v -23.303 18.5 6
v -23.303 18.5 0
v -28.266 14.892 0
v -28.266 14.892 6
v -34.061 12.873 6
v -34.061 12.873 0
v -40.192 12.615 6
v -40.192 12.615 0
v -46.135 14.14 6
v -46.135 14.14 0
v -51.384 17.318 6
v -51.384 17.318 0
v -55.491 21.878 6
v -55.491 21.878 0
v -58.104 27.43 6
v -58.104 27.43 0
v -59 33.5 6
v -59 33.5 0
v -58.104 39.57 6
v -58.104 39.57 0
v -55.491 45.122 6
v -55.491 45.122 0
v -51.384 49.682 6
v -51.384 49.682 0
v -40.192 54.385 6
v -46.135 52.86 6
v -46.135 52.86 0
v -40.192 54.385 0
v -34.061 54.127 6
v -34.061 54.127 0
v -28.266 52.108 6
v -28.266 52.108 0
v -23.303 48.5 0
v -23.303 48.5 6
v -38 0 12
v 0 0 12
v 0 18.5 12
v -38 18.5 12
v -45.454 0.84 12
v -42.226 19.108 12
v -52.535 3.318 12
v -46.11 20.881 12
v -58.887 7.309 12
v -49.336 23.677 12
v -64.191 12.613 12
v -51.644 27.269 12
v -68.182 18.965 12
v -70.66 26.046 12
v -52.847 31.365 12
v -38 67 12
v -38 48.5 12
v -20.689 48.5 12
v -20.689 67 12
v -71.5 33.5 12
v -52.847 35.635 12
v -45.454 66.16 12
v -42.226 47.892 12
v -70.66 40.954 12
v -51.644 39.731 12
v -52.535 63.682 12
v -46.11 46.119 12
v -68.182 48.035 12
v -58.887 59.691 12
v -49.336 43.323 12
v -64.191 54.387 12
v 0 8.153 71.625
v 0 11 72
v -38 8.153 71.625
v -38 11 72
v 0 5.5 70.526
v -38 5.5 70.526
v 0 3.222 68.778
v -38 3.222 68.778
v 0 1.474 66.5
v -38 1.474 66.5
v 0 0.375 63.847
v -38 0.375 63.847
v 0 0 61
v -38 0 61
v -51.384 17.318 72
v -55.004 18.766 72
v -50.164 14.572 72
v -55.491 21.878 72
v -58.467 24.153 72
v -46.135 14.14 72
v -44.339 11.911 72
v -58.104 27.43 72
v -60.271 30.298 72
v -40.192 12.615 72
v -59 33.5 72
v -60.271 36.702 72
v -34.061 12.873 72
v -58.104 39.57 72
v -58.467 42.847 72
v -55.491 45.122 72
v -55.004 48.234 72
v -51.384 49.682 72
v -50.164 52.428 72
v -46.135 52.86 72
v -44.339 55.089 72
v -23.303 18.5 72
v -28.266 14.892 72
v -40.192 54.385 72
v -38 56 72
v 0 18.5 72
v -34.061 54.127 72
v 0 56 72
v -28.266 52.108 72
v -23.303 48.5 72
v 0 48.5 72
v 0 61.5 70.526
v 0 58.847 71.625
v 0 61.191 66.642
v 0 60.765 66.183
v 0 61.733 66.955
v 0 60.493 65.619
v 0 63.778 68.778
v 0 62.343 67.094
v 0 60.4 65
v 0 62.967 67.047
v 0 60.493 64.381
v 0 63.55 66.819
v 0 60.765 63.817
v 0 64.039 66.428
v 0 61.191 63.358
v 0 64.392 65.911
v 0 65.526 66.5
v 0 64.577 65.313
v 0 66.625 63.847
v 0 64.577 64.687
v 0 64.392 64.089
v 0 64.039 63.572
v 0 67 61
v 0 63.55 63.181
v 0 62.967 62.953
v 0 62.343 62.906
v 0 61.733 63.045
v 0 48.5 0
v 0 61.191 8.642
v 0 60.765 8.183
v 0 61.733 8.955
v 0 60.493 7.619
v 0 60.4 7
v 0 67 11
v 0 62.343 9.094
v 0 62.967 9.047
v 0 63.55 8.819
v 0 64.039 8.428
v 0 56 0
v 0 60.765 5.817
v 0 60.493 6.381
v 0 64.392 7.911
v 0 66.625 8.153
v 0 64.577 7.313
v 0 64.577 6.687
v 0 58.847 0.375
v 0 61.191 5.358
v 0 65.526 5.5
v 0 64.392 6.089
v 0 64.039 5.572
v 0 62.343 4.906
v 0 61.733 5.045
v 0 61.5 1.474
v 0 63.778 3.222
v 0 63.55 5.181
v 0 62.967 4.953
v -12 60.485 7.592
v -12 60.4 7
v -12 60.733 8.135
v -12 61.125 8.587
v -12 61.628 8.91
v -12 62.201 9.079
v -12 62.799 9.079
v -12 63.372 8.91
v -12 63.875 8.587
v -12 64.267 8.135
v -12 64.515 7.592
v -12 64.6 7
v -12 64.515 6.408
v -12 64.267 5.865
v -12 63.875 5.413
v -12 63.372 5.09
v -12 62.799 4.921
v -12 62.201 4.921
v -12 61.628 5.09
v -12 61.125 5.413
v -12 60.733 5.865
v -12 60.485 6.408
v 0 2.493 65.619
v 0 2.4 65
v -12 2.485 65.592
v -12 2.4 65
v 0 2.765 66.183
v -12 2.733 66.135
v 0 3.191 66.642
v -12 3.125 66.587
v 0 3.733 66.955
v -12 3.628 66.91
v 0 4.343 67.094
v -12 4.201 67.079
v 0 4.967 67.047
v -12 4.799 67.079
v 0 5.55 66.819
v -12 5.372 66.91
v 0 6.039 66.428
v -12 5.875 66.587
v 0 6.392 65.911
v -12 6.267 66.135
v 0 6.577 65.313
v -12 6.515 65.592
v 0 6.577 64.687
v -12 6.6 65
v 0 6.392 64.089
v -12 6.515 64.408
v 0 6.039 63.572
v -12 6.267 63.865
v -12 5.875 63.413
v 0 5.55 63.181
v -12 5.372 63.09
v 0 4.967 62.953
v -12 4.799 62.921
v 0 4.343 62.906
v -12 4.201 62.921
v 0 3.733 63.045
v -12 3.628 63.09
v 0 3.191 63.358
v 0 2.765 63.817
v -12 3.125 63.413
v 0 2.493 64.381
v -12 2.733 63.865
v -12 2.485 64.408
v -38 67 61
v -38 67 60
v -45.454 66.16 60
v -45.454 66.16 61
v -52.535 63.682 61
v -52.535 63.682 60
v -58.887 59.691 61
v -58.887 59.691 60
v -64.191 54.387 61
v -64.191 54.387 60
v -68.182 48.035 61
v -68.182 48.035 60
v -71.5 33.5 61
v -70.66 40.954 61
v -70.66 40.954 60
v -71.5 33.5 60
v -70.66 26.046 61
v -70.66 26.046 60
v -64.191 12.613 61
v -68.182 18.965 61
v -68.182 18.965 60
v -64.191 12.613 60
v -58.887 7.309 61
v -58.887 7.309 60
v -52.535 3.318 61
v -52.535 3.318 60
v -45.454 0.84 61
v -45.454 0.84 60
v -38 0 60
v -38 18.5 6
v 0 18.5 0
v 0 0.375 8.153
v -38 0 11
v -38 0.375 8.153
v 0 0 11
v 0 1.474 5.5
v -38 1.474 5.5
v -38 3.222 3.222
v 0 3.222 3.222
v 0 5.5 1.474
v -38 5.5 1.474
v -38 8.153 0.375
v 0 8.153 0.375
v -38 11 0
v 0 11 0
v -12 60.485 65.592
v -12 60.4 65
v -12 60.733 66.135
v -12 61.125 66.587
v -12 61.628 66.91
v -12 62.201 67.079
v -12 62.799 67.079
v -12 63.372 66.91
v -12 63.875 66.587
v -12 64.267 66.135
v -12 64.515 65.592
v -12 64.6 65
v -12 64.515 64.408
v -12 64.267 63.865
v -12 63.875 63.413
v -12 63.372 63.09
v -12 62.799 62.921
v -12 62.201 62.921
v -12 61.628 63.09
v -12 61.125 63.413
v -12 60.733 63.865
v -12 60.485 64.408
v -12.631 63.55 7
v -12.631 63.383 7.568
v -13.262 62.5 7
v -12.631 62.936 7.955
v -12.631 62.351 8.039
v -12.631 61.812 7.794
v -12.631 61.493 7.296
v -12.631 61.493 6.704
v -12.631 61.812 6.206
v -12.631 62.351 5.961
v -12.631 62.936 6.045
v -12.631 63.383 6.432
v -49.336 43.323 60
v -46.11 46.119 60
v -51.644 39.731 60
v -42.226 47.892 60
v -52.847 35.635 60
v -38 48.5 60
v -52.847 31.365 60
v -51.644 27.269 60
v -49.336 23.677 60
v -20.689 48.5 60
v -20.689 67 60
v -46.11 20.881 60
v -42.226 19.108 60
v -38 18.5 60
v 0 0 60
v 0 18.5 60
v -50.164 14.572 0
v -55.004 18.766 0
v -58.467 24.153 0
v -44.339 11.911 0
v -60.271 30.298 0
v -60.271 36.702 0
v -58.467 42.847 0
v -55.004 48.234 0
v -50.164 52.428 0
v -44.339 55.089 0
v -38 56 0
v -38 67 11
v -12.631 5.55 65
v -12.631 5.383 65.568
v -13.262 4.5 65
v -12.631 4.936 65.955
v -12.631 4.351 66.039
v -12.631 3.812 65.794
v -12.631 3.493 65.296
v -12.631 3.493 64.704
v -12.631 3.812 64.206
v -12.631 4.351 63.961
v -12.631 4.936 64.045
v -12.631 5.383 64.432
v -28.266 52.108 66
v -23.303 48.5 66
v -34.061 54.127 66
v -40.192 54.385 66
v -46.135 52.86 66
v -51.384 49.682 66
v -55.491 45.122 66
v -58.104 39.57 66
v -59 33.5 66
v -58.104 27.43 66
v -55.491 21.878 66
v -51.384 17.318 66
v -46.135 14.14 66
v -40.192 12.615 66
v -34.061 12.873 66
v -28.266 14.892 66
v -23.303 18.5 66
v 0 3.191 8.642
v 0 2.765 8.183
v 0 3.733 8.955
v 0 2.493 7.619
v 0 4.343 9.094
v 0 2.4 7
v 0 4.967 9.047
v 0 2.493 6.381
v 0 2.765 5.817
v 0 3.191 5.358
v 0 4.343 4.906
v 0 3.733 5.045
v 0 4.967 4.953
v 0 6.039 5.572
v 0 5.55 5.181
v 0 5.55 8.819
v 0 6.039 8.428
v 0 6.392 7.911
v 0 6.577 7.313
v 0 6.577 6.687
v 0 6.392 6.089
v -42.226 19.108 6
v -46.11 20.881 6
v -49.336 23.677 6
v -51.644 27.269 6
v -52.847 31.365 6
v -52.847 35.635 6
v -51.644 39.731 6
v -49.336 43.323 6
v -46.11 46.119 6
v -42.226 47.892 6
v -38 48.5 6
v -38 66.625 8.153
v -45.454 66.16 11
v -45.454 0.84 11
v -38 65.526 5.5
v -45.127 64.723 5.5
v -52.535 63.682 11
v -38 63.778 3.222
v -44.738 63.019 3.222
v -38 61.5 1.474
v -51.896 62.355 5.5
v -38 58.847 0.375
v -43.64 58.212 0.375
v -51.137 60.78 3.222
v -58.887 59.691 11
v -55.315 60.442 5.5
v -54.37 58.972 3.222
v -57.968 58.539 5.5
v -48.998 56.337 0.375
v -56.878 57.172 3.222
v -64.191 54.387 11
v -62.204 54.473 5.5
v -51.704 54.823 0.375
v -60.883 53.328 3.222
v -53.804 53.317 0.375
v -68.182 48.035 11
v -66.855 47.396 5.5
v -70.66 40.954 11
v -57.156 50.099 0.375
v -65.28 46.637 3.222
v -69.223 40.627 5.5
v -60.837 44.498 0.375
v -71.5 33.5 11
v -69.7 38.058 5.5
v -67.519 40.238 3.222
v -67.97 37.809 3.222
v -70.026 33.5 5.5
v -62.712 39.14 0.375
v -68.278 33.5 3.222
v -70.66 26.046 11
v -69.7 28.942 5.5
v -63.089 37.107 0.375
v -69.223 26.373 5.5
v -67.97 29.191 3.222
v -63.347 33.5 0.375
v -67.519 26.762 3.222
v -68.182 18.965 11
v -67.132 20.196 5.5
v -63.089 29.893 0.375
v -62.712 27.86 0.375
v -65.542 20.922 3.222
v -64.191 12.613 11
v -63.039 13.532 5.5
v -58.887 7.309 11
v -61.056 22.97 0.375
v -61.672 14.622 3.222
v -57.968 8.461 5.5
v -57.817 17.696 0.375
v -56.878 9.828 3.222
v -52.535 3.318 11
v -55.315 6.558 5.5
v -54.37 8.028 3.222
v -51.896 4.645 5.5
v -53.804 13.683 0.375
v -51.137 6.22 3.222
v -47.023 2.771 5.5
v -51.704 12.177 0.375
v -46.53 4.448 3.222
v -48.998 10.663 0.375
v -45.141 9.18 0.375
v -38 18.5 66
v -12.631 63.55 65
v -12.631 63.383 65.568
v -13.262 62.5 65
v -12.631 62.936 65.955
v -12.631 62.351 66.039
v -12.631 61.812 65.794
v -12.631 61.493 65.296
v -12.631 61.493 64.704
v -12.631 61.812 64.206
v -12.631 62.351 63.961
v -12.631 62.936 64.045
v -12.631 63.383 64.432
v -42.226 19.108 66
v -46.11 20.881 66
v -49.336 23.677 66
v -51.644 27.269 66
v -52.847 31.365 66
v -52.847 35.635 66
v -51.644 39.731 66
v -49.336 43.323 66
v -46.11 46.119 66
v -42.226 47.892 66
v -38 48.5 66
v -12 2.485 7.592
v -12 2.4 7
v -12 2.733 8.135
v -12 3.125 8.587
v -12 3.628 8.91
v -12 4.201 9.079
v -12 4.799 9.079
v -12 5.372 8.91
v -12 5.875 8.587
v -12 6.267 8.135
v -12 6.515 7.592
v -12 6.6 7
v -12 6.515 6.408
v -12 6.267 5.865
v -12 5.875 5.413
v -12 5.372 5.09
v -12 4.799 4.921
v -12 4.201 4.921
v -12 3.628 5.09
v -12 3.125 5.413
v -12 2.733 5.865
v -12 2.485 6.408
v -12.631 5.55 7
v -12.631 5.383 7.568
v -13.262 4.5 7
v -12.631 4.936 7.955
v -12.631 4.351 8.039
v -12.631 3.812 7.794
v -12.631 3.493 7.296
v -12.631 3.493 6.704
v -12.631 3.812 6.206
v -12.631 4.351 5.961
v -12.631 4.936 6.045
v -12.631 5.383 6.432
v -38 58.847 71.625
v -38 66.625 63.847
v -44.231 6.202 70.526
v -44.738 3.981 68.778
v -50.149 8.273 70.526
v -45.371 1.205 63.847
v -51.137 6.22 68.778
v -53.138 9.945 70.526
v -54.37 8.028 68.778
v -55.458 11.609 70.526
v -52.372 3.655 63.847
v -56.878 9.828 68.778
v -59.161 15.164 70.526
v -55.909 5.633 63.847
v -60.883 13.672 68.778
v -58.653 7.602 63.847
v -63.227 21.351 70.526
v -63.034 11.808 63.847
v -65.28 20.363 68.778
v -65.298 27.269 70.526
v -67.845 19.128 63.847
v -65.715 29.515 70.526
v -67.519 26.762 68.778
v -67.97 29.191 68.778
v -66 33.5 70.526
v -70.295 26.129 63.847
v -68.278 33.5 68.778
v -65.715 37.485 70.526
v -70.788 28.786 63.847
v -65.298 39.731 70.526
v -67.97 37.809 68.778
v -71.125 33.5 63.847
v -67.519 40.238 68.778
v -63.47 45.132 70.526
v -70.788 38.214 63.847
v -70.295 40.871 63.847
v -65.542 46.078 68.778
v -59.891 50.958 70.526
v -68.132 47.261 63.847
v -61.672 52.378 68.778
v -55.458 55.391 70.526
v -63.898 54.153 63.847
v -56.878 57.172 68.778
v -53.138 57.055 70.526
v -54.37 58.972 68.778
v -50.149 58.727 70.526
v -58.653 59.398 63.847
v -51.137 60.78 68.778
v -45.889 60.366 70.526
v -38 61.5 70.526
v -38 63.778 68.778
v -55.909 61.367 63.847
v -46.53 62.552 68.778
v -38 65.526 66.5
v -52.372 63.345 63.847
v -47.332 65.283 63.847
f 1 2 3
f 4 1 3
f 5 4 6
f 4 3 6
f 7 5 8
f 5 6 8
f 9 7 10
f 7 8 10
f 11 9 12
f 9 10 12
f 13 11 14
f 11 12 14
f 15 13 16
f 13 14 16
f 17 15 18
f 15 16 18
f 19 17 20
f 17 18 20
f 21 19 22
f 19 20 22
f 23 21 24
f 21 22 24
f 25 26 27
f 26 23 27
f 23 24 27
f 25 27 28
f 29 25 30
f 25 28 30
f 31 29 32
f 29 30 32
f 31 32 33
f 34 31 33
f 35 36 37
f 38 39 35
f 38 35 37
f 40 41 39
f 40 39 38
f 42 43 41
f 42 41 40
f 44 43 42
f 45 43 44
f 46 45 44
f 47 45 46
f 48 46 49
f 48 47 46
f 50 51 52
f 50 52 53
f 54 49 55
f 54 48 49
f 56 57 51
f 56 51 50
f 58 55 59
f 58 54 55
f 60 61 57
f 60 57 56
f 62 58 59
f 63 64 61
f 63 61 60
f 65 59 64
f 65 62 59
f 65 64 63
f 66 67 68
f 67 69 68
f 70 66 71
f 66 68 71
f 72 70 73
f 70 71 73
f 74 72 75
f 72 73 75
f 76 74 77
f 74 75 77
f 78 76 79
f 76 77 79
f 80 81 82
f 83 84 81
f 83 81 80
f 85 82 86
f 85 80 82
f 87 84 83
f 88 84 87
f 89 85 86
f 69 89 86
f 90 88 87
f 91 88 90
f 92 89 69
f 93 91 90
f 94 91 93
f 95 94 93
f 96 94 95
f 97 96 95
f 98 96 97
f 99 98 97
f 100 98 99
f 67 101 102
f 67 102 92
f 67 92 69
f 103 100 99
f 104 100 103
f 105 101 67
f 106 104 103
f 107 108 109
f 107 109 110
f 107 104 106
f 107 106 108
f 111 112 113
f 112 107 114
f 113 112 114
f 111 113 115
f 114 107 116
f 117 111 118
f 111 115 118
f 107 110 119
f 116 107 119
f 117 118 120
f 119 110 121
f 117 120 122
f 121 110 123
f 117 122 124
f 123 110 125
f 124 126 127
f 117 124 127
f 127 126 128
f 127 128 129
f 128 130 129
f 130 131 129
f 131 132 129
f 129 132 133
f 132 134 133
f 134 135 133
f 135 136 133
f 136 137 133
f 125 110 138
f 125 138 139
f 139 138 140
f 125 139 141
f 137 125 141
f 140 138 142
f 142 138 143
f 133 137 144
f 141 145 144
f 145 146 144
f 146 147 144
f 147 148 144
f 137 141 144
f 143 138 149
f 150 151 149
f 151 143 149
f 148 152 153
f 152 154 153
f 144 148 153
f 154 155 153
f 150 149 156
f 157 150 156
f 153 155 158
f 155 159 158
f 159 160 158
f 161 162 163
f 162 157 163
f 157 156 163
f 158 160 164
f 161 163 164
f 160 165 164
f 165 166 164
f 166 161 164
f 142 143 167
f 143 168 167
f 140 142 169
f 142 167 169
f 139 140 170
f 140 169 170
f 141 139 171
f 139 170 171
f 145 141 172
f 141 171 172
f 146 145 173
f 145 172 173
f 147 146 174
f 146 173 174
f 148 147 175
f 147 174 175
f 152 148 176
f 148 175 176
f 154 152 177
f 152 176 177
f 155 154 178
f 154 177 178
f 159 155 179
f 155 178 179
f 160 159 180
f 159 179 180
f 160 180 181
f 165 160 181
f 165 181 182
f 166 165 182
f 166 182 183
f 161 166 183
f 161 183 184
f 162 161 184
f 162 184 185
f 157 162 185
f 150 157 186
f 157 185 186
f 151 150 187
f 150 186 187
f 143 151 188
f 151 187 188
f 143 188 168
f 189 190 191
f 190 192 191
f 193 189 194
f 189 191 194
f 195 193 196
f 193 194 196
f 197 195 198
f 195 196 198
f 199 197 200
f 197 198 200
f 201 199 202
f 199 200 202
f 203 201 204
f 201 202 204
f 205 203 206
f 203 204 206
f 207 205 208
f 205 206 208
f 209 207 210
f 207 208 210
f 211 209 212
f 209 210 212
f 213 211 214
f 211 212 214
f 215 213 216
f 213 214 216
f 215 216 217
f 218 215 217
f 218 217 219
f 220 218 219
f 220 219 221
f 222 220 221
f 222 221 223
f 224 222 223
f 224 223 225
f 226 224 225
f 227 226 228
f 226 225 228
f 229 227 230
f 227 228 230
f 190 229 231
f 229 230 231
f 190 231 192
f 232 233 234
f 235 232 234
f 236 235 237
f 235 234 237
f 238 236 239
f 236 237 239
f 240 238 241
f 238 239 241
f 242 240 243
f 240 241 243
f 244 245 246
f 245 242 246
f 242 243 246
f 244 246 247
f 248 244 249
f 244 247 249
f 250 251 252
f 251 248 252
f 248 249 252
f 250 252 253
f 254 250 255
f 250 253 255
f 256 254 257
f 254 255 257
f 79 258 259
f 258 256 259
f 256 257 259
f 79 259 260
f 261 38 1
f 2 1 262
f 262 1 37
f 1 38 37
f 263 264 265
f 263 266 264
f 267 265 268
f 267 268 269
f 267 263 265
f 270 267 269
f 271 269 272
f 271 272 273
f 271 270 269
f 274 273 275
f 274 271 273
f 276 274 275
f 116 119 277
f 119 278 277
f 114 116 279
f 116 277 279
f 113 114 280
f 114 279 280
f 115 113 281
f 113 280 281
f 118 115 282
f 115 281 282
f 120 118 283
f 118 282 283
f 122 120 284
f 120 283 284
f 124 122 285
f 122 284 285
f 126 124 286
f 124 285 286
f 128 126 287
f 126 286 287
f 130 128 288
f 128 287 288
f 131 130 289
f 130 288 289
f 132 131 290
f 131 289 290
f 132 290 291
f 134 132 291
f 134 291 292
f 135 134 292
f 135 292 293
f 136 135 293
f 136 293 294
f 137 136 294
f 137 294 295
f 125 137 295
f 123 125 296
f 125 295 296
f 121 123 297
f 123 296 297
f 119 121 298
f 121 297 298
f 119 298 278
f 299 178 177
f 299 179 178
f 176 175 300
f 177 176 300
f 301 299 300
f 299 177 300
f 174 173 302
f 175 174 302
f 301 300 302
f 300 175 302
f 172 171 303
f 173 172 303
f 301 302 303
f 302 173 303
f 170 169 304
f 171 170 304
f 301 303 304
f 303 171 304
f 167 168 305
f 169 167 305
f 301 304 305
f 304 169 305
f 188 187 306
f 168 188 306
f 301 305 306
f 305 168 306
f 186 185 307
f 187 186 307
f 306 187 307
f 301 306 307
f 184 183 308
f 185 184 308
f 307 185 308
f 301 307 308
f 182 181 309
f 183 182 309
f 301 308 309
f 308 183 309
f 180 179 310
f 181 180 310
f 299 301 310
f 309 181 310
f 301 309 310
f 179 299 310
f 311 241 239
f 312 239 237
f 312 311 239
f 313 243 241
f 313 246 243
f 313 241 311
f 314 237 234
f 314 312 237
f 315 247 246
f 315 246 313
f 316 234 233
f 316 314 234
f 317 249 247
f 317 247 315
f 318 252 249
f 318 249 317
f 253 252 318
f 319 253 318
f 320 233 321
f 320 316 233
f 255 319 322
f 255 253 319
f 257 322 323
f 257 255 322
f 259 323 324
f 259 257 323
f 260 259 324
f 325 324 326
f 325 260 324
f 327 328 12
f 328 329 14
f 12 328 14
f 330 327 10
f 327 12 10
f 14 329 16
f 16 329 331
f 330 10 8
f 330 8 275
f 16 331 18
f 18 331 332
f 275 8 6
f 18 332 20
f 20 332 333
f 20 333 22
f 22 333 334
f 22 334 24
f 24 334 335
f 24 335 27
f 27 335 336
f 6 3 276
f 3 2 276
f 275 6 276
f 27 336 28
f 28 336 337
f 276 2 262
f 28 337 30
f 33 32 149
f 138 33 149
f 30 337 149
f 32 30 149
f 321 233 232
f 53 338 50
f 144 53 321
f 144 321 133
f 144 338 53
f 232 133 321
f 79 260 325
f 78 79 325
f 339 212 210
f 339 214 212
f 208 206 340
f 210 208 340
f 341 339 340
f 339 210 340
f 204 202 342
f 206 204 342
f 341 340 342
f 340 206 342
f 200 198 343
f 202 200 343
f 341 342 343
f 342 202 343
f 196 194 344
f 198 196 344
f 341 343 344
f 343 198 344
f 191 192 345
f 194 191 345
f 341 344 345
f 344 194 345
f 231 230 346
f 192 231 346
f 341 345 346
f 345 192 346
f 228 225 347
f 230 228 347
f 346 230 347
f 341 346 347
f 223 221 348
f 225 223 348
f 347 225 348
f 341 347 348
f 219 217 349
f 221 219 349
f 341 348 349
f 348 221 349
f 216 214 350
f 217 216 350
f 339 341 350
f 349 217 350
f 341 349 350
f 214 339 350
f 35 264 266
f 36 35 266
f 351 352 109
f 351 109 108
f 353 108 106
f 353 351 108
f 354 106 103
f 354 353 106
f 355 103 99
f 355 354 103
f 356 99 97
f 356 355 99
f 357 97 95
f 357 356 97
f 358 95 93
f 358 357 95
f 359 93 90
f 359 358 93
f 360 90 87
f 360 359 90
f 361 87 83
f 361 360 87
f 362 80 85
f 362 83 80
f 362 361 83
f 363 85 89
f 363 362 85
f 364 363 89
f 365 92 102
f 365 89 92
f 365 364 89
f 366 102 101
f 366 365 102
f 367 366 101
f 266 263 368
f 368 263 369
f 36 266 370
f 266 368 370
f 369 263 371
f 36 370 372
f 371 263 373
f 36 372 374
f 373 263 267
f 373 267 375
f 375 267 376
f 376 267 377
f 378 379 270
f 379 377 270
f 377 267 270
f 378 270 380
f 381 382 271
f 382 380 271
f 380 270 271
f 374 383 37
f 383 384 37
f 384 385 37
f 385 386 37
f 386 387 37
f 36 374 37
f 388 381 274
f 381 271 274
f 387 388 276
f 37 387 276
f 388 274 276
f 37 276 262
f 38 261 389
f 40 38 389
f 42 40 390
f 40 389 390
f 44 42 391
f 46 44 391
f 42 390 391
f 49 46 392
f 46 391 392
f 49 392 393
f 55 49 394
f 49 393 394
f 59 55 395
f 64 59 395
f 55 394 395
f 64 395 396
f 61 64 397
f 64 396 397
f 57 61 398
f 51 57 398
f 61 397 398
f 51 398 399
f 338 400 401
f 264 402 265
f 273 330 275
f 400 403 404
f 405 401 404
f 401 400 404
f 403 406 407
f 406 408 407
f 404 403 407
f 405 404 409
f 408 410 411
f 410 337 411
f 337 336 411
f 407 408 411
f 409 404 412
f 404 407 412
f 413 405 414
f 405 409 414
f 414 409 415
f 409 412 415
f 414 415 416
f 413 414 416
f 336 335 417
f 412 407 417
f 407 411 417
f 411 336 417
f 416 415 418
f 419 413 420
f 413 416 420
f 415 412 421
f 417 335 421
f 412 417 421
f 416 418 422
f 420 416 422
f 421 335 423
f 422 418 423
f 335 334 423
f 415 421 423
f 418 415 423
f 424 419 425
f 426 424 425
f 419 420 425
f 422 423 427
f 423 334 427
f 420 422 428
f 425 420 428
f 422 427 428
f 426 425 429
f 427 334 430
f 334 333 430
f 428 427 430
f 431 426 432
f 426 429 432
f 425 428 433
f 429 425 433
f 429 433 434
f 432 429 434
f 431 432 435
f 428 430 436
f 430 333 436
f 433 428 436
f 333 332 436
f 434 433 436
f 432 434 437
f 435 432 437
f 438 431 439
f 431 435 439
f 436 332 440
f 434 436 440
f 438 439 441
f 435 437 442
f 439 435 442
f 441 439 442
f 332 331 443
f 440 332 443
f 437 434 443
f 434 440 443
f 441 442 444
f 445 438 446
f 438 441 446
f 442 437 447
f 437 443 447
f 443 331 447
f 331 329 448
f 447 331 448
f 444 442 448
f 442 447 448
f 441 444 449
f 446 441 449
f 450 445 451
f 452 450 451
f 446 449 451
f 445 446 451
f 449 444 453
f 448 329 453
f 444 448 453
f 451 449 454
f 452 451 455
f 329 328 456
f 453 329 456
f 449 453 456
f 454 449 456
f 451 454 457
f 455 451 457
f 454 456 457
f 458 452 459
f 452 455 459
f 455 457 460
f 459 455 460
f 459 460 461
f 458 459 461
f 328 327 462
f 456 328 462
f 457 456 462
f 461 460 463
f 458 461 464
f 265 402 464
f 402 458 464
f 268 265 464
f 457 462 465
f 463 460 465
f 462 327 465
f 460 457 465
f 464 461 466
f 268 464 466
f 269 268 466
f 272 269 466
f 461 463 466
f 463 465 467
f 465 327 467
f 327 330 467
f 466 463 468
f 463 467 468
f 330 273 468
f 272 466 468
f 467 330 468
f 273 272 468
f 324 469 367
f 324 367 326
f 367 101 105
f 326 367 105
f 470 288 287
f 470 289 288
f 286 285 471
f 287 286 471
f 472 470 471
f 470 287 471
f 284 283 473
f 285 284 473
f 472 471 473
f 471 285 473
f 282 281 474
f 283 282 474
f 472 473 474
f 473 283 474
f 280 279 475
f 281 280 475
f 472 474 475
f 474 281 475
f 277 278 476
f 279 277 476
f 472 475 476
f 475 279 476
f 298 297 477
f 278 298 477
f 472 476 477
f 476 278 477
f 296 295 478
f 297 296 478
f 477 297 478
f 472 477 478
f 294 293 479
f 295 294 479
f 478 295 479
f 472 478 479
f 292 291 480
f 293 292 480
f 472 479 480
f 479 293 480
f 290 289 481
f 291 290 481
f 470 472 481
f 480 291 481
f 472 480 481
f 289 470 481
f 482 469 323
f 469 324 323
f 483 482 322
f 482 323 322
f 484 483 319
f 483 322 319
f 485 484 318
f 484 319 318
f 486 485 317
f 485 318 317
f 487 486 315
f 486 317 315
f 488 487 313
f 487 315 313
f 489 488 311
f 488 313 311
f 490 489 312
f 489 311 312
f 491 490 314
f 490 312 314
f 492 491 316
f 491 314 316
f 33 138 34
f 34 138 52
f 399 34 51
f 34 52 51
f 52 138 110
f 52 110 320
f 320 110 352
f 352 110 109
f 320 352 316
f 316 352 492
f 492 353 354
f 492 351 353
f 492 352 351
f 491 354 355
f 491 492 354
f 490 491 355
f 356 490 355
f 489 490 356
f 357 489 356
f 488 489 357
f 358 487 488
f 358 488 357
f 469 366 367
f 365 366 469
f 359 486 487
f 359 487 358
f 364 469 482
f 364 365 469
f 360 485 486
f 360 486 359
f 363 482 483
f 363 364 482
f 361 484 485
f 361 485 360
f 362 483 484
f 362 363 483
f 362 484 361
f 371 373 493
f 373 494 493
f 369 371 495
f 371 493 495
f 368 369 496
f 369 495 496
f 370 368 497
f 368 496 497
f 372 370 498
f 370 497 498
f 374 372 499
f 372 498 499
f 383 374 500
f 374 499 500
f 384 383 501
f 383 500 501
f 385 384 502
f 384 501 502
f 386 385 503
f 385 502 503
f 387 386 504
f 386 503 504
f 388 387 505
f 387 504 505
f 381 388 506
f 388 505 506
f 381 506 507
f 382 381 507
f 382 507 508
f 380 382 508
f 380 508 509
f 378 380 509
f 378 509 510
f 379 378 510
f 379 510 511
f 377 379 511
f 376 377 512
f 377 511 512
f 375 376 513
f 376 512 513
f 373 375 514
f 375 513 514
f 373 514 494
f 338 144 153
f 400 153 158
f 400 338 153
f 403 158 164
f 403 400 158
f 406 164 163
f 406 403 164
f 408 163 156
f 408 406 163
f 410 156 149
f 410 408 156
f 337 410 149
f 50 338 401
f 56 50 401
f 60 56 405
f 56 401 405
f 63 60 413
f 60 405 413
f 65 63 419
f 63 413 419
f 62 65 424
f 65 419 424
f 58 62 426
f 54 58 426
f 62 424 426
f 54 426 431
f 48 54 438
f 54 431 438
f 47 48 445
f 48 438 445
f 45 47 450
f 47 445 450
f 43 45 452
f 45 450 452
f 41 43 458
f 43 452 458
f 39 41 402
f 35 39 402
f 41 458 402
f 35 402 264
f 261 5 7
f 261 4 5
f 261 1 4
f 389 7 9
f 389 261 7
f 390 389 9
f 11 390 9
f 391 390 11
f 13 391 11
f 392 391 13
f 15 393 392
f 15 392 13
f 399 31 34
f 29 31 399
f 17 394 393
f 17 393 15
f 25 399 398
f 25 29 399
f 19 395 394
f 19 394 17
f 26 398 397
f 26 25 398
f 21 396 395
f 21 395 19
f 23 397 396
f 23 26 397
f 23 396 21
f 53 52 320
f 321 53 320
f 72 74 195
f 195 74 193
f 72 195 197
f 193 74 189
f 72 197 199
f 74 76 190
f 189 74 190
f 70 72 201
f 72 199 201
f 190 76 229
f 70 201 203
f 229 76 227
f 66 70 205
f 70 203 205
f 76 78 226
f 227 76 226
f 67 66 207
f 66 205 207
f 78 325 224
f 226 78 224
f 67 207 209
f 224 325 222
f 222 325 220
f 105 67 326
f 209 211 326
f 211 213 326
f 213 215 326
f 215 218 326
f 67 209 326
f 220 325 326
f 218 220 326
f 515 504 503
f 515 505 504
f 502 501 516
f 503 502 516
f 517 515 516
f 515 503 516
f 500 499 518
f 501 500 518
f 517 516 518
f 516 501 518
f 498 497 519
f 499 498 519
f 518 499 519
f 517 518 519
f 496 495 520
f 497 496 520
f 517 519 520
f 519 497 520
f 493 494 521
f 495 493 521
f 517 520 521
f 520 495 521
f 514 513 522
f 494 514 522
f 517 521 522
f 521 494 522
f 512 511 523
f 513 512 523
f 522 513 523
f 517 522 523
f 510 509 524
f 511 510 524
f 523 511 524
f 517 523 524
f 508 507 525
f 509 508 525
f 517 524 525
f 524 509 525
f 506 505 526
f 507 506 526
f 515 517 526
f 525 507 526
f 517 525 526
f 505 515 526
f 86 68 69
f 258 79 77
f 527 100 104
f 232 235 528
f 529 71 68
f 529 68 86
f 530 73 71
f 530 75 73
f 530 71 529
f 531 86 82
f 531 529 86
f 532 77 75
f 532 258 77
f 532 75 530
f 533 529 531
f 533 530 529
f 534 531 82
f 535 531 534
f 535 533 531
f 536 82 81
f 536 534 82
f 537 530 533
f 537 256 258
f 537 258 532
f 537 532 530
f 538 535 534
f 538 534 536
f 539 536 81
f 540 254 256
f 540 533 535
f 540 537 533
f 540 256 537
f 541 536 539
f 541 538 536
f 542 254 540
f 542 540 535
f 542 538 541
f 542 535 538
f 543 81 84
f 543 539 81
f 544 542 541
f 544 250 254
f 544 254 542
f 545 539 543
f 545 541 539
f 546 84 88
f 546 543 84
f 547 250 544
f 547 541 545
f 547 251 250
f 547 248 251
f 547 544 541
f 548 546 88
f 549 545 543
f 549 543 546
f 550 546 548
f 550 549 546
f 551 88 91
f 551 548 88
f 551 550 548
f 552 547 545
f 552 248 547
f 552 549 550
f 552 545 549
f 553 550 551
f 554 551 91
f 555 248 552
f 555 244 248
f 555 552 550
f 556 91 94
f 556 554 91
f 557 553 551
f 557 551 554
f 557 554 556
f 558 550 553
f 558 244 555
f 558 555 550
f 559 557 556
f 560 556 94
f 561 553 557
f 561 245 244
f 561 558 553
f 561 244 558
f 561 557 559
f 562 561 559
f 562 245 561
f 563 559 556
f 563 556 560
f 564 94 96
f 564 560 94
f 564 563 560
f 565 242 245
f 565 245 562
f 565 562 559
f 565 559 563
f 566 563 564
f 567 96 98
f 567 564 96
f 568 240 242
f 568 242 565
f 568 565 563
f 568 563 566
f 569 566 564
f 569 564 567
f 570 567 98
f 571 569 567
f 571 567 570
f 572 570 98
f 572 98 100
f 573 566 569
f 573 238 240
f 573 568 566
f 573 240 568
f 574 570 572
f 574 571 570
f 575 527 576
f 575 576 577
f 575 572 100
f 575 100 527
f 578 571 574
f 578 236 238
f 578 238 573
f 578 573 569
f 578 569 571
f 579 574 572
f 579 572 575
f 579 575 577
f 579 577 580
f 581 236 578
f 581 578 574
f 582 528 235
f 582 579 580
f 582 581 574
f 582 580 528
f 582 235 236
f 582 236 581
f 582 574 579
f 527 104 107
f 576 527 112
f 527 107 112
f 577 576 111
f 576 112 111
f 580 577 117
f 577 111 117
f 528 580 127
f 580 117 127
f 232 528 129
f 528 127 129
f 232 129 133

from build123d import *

# Parameters (mm, degrees)
SKETCH1_W             = 38
SKETCH1_H             = 67
BOSS_EXTRUDE1_DEPTH   = 72
SKETCH2_R             = 21
CUT_EXTRUDE1_DEPTH    = 6
CUT_EXTRUDE2_START    = -6
SKETCH3_R             = 21
CUT_EXTRUDE2_DEPTH    = 6
SKETCH4_W             = 50.811271485
SKETCH4_H             = 48
CUT_EXTRUDE3_DEPTH    = 122.594613368
SKETCH6_R             = 15
CUT_EXTRUDE4_DEPTH    = 200
FILLET2_R             = 11
SKETCH10_W            = 47
SKETCH10_H            = 29.40683467
CUT_EXTRUDE7_DEPTH    = 82
CUT_EXTRUDE10_REACH   = 123.595
M5_TAPPED_HOLE1_D     = 4.2
M5_TAPPED_HOLE1_DEPTH = 12
M5_TAPPED_HOLE1_TIP   = 1.2618073
SKETCH13_W            = 0.5
SKETCH13_H            = 18.5
CUT_EXTRUDE11_DEPTH   = 111.701333822


with BuildPart() as part:
    # Sketch1 → Boss-Extrude1 (new body)
    with BuildSketch(Plane.XY):
        with Locations((-19, 33.5)):
            Rectangle(SKETCH1_W, SKETCH1_H)
        with BuildLine():
            Line((-38, 0), (-38, 67))
            ThreePointArc((-38, 67), (-71.5, 33.5), (-38, 0))
        make_face()
    extrude(amount=BOSS_EXTRUDE1_DEPTH)

    # Sketch2 → Cut-Extrude1 (cut)
    with BuildSketch(Plane(origin=(0, 0, 0), x_dir=(-1, 0, 0), z_dir=(0, 0, -1))):
        with Locations((38, 33.5)):
            Circle(SKETCH2_R)
    extrude(amount=-CUT_EXTRUDE1_DEPTH, mode=Mode.SUBTRACT)

    # Sketch3 → Cut-Extrude2 (cut)
    with BuildSketch(Plane.XY.offset(72).offset(CUT_EXTRUDE2_START)):
        with Locations(Location((-38, 33.5, 0), (0, 0, 180))):
            Circle(SKETCH3_R)
    extrude(amount=CUT_EXTRUDE2_DEPTH, mode=Mode.SUBTRACT)

    # Sketch4 → Cut-Extrude3 (cut, through all)
    with BuildSketch(Plane.XZ):
        with Locations((-46.094364258, 36)):
            Rectangle(SKETCH4_W, SKETCH4_H)
    extrude(amount=-CUT_EXTRUDE3_DEPTH, mode=Mode.SUBTRACT)

    # Sketch6 → Cut-Extrude4 (cut)
    with BuildSketch(Plane(origin=(0, 0, 0), x_dir=(-1, 0, 0), z_dir=(0, 0, -1))):
        with Locations((38, 33.5)):
            Circle(SKETCH6_R)
    extrude(amount=-CUT_EXTRUDE4_DEPTH, mode=Mode.SUBTRACT)

    # Fillet2
    fillet2_edges = [part.edges().sort_by_distance(p)[0] for p in [
        (-19, 67, 72),
        (-71.5, 33.5, 72),
        (-19, 0, 72),
        (-19, 0, 0),
        (-71.5, 33.5, 0),
        (-19, 67, 0),
    ]]
    fillet(fillet2_edges, radius=FILLET2_R)

    # Sketch10 → Cut-Extrude7 (cut)
    with BuildSketch(Plane(origin=(0, 0, 0), x_dir=(0, 0, -1), z_dir=(1, 0, 0))):
        with Locations((-36, 14.703417335)):
            Rectangle(SKETCH10_W, SKETCH10_H)
    extrude(amount=-CUT_EXTRUDE7_DEPTH, mode=Mode.SUBTRACT)

    # Sketch11 → Cut-Extrude10 (cut, up to next)
    with BuildSketch(Plane.XY.offset(72), mode=Mode.PRIVATE) as cut_extrude10_sk1:
        with BuildLine():
            Line((-38, 48.5), (-38, 33.5))
            Line((-38, 33.5), (-17, 33.5))
            ThreePointArc((-17, 33.5), (-18.639786835, 41.635241005), (-23.303061543, 48.5))
            Line((-23.303061543, 48.5), (-38, 48.5))
        make_face()
    cut_extrude10_tool1 = extrude(cut_extrude10_sk1.sketch, amount=-CUT_EXTRUDE10_REACH, mode=Mode.PRIVATE) & part.part
    # Sketch11 → Cut-Extrude10 (cut, up to next)
    with BuildSketch(Plane.XY.offset(72), mode=Mode.PRIVATE) as cut_extrude10_sk2:
        with BuildLine():
            ThreePointArc((-23.303061543, 48.5), (-18.639786835, 41.635241005), (-17, 33.5))
            Line((-17, 33.5), (0, 33.5))
            Line((0, 33.5), (0, 48.5))
            Line((0, 48.5), (-23.303061543, 48.5))
        make_face()
    cut_extrude10_tool2 = extrude(cut_extrude10_sk2.sketch, amount=-CUT_EXTRUDE10_REACH, mode=Mode.PRIVATE) & part.part
    # Sketch11 → Cut-Extrude10 (cut, up to next)
    with BuildSketch(Plane.XY.offset(72), mode=Mode.PRIVATE) as cut_extrude10_sk3:
        with BuildLine():
            Line((0, 33.5), (-17, 33.5))
            ThreePointArc((-17, 33.5), (-18.639786835, 25.364758995), (-23.303061543, 18.5))
            Line((-23.303061543, 18.5), (0, 18.5))
            Line((0, 18.5), (0, 33.5))
        make_face()
    cut_extrude10_tool3 = extrude(cut_extrude10_sk3.sketch, amount=-CUT_EXTRUDE10_REACH, mode=Mode.PRIVATE) & part.part
    # Sketch11 → Cut-Extrude10 (cut, up to next)
    with BuildSketch(Plane.XY.offset(72), mode=Mode.PRIVATE) as cut_extrude10_sk4:
        with BuildLine():
            Line((-17, 33.5), (-38, 33.5))
            Line((-38, 33.5), (-38, 18.5))
            Line((-38, 18.5), (-23.303061543, 18.5))
            ThreePointArc((-23.303061543, 18.5), (-18.639786835, 25.364758995), (-17, 33.5))
        make_face()
    cut_extrude10_tool4 = extrude(cut_extrude10_sk4.sketch, amount=-CUT_EXTRUDE10_REACH, mode=Mode.PRIVATE) & part.part
    add(cut_extrude10_tool1.solids().sort_by_distance((-28.39059, 40.602283, 72))[0], mode=Mode.SUBTRACT)
    add(cut_extrude10_tool2.solids().sort_by_distance((-9.565982, 41.399556, 72))[0], mode=Mode.SUBTRACT)
    add(cut_extrude10_tool3.solids().sort_by_distance((-9.565982, 25.600444, 72))[0], mode=Mode.SUBTRACT)
    add(cut_extrude10_tool4.solids().sort_by_distance((-28.39059, 26.397717, 72))[0], mode=Mode.SUBTRACT)

    # M5 Tapped Hole1
    with Locations(Plane(origin=(0, 62.5, 65), x_dir=(0, 1, 0), z_dir=(1, 0, 0))):
        with Locations((0, 0), (0, -58), (-58, -58), (-58, 0)):
            Hole(M5_TAPPED_HOLE1_D / 2, depth=M5_TAPPED_HOLE1_DEPTH)
            with Locations((0, 0, -(M5_TAPPED_HOLE1_DEPTH + M5_TAPPED_HOLE1_TIP / 2))):  # 118° drill point
                Cone(0, M5_TAPPED_HOLE1_D / 2, M5_TAPPED_HOLE1_TIP, mode=Mode.SUBTRACT)

    # Sketch13 → Cut-Extrude11 (cut, through all)
    with BuildSketch(Plane.ZY.offset(20.688728515)):
        with Locations((59.75, 9.25)):
            Rectangle(SKETCH13_W, SKETCH13_H)
        with Locations((12.25, 9.25)):
            Rectangle(SKETCH13_W, SKETCH13_H)
    extrude(amount=-CUT_EXTRUDE11_DEPTH, mode=Mode.SUBTRACT)


solid = part.part
